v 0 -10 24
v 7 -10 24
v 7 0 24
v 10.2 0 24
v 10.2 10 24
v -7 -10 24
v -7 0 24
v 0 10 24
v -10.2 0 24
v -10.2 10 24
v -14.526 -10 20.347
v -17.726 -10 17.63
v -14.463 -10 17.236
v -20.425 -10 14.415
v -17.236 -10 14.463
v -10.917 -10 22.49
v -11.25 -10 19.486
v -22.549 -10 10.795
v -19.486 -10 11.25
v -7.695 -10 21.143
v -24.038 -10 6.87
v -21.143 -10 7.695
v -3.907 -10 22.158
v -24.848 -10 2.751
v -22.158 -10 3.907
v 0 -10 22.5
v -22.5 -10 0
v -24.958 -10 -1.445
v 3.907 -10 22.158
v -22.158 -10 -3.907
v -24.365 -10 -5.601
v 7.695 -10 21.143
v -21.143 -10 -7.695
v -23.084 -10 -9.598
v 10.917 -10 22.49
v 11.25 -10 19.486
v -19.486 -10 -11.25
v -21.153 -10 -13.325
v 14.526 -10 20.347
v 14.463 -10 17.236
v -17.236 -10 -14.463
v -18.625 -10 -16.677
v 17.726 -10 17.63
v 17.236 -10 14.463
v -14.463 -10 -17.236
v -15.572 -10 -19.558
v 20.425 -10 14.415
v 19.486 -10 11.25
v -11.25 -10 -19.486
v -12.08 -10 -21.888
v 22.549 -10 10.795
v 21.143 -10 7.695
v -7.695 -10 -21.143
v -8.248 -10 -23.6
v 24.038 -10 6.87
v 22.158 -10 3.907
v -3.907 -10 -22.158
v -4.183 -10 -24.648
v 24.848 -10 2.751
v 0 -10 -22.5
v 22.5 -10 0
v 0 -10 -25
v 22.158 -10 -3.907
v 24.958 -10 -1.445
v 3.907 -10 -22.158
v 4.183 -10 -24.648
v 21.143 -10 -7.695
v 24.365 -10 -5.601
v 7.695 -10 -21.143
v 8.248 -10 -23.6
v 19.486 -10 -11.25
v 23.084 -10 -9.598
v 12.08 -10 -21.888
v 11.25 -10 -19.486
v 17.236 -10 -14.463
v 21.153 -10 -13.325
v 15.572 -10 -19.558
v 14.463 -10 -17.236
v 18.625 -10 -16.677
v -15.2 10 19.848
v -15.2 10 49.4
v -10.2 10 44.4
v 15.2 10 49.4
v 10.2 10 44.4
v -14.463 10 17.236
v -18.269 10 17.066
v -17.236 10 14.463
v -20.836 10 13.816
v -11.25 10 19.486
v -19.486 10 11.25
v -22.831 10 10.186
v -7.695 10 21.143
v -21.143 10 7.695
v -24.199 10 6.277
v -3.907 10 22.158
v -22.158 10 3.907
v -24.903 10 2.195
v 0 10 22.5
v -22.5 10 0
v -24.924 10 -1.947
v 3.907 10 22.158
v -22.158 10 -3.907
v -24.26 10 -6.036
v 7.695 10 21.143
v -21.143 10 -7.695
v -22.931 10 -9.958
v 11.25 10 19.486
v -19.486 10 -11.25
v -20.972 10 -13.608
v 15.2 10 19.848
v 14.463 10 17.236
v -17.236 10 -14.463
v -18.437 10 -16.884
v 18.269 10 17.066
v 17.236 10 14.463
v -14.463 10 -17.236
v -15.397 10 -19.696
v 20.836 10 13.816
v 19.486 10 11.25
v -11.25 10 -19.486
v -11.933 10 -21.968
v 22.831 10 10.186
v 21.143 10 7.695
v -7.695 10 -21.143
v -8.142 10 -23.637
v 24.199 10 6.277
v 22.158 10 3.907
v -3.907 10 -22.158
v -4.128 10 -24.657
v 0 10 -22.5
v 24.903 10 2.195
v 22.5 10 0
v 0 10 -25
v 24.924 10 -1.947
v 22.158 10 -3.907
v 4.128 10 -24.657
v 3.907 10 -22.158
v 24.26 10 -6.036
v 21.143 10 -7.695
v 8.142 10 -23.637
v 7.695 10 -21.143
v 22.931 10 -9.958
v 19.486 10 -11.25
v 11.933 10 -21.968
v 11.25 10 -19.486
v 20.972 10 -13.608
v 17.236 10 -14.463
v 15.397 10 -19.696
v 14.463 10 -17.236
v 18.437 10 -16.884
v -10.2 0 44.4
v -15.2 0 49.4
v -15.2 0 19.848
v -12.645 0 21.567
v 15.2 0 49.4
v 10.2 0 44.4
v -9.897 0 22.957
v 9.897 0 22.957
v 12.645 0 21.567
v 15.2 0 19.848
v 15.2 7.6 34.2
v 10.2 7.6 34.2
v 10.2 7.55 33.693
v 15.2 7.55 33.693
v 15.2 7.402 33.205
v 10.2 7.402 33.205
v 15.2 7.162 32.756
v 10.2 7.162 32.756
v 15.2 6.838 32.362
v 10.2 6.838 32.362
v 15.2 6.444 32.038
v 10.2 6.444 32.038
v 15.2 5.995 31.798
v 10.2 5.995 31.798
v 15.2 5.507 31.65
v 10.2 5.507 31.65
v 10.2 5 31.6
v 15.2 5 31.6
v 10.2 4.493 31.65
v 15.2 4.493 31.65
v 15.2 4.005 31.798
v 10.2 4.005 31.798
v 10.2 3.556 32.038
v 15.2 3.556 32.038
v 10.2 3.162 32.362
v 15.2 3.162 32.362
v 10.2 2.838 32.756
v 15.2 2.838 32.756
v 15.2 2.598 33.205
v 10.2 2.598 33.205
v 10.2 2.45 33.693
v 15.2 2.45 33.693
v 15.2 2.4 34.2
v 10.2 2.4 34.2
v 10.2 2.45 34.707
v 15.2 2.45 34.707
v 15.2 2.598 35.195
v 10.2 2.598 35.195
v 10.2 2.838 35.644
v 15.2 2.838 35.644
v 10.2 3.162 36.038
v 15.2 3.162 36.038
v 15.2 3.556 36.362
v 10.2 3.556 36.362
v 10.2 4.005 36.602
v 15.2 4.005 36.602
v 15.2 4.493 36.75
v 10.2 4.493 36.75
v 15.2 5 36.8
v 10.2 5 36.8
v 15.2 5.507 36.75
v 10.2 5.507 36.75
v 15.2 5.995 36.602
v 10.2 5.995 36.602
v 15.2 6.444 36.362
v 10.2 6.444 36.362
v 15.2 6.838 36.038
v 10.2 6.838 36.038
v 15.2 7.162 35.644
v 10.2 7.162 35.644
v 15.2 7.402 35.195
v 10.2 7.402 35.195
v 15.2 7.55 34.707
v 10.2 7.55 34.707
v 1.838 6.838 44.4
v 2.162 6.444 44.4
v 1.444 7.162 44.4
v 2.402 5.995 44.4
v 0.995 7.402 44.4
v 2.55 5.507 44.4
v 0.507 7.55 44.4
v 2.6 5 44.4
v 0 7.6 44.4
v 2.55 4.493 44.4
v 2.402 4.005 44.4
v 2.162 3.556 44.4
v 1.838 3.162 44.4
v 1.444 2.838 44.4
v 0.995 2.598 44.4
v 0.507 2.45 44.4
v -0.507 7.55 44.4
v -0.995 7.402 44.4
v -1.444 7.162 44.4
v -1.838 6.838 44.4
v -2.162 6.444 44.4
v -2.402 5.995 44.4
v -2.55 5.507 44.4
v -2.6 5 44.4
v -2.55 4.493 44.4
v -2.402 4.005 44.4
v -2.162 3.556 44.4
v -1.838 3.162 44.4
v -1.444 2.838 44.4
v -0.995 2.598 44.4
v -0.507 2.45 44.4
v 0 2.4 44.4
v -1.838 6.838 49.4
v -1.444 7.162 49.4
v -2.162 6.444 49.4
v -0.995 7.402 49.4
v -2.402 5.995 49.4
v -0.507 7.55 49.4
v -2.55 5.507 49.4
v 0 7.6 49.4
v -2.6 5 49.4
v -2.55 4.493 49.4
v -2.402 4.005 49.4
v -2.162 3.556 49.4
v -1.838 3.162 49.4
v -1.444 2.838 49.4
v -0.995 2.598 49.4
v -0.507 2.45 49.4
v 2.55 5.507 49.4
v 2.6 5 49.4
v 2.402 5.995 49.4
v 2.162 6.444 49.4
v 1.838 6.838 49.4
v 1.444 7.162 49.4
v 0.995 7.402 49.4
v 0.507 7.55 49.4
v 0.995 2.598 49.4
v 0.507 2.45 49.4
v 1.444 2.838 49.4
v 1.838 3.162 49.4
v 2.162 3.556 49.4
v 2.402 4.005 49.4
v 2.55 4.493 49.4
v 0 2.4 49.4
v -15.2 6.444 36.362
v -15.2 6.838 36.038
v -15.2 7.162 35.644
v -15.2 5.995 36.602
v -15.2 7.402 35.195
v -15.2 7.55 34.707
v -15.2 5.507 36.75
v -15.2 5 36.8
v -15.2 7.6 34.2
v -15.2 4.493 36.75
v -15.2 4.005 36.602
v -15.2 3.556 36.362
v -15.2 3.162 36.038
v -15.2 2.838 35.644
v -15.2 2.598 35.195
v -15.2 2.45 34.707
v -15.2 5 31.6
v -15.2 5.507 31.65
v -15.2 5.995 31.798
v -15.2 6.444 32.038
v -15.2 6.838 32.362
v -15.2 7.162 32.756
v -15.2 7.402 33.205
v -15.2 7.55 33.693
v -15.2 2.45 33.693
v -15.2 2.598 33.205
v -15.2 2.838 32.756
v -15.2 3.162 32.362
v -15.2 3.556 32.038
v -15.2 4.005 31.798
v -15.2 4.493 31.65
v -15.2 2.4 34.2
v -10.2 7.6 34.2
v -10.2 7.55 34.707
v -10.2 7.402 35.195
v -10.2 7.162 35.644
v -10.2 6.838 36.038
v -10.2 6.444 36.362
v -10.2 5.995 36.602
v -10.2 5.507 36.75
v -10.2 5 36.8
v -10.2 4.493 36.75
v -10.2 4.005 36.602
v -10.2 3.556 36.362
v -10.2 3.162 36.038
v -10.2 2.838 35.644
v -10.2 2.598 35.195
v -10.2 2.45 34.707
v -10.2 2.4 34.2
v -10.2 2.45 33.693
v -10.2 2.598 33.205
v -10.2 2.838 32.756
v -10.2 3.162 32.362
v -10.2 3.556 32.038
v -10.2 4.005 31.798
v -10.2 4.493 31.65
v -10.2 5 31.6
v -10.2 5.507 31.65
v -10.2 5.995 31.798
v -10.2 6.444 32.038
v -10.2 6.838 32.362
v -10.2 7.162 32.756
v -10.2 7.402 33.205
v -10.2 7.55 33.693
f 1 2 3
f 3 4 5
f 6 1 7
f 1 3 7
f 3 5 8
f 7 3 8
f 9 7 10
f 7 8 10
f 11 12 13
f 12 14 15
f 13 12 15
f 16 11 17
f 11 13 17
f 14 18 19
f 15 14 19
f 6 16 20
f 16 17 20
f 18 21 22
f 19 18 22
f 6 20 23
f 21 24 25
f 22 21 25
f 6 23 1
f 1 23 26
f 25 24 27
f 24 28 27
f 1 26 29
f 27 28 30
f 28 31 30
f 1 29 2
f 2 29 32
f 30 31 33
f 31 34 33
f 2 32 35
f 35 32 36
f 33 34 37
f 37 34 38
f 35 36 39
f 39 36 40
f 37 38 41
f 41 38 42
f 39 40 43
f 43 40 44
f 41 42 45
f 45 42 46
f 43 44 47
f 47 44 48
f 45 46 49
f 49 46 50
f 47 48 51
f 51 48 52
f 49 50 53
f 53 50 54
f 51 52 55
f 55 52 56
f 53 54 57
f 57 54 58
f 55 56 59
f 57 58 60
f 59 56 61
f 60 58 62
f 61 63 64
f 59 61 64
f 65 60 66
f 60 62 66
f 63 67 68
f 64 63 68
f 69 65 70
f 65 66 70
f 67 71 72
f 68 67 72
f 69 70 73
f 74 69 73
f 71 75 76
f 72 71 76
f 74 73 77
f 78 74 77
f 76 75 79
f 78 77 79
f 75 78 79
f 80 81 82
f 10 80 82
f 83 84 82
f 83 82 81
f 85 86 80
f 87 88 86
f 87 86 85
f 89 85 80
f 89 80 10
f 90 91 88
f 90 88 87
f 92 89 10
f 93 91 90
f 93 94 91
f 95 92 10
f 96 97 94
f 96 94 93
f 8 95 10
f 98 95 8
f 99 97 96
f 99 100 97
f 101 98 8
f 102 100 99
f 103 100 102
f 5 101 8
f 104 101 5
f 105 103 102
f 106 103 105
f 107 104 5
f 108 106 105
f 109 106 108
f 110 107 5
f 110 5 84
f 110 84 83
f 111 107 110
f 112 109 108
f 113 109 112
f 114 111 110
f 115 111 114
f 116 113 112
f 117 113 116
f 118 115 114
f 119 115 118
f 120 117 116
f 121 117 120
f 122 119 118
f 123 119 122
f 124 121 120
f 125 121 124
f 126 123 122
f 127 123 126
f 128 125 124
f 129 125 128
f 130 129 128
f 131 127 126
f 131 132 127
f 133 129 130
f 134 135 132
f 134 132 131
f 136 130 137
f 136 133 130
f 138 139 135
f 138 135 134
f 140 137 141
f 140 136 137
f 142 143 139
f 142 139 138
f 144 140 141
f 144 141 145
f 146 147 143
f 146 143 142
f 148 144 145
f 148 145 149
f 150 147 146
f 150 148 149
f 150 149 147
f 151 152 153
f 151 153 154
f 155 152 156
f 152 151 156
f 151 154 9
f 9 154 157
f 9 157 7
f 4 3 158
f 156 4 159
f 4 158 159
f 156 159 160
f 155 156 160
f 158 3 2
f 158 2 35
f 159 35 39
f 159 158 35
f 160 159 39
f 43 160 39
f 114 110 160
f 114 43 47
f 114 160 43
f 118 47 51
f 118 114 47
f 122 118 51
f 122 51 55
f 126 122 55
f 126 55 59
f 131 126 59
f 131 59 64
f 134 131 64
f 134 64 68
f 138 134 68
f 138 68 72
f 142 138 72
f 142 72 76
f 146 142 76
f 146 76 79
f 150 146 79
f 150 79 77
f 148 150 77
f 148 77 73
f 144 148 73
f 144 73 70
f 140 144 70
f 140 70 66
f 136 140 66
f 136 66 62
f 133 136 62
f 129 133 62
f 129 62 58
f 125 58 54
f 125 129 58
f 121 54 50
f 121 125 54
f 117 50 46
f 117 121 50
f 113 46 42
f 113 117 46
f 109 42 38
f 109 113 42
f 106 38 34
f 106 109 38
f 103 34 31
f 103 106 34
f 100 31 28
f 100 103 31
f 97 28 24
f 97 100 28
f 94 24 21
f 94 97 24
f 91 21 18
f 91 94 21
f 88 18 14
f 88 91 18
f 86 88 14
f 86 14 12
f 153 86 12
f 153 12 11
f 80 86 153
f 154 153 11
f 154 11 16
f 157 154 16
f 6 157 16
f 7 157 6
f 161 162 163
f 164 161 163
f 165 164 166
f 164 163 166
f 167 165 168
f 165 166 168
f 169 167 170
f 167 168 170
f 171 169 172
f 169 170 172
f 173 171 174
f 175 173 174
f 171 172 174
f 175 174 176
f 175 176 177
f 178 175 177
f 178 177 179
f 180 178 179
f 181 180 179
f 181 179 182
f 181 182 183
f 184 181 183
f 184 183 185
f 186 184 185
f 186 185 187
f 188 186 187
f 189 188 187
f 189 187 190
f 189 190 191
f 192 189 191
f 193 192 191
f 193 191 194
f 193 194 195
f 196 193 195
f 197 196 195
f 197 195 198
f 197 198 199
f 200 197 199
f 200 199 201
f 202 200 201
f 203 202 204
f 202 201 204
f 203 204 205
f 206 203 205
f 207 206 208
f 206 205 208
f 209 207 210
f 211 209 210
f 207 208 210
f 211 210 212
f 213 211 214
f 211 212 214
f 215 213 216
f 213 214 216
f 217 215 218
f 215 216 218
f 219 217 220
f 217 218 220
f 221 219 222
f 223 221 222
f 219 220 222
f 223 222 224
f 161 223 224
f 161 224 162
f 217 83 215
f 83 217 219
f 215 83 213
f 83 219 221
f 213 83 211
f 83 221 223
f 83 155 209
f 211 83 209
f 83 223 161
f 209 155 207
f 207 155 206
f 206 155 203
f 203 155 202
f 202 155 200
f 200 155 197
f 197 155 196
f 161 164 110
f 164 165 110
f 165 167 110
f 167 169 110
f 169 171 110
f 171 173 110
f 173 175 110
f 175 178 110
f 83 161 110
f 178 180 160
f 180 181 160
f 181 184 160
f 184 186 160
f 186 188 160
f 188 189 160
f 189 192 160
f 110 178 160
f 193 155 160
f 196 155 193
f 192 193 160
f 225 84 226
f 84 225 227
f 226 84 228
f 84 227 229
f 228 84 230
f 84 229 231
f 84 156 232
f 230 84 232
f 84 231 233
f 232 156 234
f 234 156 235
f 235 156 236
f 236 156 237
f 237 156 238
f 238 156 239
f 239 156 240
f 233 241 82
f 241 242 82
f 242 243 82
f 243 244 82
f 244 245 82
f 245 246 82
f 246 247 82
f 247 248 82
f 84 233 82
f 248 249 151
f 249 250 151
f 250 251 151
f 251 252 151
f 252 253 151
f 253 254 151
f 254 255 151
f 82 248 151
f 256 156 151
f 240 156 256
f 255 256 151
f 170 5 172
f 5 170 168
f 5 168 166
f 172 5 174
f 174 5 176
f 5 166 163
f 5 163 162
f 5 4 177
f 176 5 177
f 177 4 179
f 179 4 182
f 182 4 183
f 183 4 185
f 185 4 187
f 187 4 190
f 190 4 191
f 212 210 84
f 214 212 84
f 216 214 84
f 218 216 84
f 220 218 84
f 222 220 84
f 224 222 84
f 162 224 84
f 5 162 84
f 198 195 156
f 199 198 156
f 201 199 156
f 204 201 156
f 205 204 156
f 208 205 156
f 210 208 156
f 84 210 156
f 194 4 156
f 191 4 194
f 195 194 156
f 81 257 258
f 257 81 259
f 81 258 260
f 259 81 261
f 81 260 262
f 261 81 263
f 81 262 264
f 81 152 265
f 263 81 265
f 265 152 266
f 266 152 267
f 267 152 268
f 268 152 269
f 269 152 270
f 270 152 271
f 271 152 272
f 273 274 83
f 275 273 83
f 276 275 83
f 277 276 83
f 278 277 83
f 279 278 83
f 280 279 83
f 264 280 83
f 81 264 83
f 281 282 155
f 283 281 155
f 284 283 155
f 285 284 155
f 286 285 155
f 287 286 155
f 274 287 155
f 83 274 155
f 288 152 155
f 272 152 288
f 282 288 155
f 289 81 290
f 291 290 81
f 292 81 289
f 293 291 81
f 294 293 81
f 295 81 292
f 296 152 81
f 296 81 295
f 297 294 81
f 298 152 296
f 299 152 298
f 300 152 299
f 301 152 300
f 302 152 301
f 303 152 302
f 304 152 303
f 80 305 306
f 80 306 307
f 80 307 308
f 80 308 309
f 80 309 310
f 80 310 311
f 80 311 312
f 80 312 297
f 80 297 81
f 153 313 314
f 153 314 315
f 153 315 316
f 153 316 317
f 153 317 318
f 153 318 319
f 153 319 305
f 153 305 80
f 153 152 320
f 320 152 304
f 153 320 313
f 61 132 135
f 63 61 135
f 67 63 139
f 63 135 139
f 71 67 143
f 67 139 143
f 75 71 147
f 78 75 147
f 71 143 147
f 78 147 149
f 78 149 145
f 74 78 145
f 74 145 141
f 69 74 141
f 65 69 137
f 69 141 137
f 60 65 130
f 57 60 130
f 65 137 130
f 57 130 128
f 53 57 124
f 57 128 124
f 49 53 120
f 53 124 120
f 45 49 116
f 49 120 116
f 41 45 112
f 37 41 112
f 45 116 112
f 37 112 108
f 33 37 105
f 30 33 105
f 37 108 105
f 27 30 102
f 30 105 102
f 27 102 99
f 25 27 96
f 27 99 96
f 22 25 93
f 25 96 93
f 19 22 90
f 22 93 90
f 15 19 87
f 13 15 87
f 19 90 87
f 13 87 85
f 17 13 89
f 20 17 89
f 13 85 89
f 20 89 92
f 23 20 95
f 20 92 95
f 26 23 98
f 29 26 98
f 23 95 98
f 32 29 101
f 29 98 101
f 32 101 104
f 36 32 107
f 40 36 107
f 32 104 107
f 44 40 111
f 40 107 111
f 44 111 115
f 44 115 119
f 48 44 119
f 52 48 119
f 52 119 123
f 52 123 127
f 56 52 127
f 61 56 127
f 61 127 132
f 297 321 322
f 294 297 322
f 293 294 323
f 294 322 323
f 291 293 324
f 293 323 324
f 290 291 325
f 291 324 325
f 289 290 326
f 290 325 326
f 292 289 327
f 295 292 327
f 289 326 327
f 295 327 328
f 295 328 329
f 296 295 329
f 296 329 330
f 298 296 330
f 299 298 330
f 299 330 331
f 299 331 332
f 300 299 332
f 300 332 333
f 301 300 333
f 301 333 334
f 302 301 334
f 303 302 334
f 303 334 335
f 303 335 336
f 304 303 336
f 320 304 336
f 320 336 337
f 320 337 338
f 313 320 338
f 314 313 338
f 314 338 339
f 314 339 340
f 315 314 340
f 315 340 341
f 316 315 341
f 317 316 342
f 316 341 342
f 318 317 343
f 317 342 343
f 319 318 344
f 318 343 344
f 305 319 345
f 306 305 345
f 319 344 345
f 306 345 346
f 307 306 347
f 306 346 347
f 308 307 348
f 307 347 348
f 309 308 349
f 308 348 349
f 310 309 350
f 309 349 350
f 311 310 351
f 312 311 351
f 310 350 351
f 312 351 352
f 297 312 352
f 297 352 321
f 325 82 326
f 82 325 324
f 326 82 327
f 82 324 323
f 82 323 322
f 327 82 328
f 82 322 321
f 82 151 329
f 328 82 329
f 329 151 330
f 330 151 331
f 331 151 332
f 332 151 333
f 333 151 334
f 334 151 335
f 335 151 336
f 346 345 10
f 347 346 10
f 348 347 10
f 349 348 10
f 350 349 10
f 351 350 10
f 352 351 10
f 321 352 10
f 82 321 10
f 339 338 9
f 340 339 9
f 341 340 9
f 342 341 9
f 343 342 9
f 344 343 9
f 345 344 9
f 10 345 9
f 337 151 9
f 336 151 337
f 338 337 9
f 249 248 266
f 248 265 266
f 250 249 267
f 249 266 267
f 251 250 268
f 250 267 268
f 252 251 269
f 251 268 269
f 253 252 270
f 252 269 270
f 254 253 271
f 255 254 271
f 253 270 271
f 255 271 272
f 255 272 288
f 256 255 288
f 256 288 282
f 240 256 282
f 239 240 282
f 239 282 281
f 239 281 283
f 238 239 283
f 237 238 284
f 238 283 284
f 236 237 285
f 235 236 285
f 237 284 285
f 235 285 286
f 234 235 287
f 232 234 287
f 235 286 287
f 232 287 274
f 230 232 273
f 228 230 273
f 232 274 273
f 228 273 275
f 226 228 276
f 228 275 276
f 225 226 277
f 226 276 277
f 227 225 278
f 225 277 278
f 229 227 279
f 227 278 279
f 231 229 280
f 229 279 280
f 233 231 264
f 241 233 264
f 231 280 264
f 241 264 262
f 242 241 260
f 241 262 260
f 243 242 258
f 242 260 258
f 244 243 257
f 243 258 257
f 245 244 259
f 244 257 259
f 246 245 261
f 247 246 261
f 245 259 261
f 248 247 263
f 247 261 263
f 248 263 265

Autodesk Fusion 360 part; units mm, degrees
sketch "스케치1" plane through (0, 0, 0) normal (0, 1, 0) x (1, 0, 0)
  circle A0 centre (0, 0) radius 22.5
  line L0 (0, 0) -> (0, -24)
  line L1 (0, -24) -> (15.2, -24)
  line L2 (15.2, -24) -> (-15.2, -24)
  line L3 (-15.2, -24) -> (-15.2, -49.4)
  line L4 (-15.2, -49.4) -> (15.2, -49.4)
  line L5 (15.2, -49.4) -> (15.2, -24)
  circle A1 centre (0, 0) radius 25
  line L6 (-15.2, -24) -> (-15.2, -18.5)
  line L7 (15.2, -24) -> (15.2, -18.5685)
  line L8 (0, -36.7) -> (0, -34.2)
  line L9 (10.2, -44.4) -> (-10.2, -44.4)
  line L10 (-10.2, -44.4) -> (-10.2, -24)
  line L11 (-10.2, -24) -> (10.2, -24)
  line L12 (10.2, -24) -> (10.2, -44.4)
  line L13 (10.2, -44.4) -> (-10.2, -24) construction
  line L14 (-10.2, -44.4) -> (10.2, -24) construction
  point P0 (0, -36.7)
  point P1 (0, -34.2)
  dimension "d1" = 45
  dimension "d2" = 24
  dimension "d3" = 15.2
  dimension "d4" = 30.4
  dimension "d5" = 25.4
  dimension "d8" = 50
  dimension "d13" = 2.5
  dimension "d14" = 20.4
  dimension "d15" = 20.4
extrude "돌출1" add sketch "스케치1" along normal blind 10 contours L1 L2 A1 L7 L11 | L1 L2 L3 L4 L5 L9 L10 L12 | L1 L2 A1 L11 | L2 A1 L6 L11 picked at (-16.0726, -17.9881)
extrude "돌출2" add sketch "스케치1" against normal blind 10 contours L1 L2 A1 L11 picked at (-16.0726, -17.9881)
sketch "스케치2" plane through (0, 0, 49.4) normal (0, 0, 1) x (-1, 0, 0)
  line L0 (15.2, 0) -> (-15.2, 0)
  line L1 (-15.2, 0) -> (-15.2, -10)
  line L2 (-15.2, -10) -> (15.2, -10)
  line L3 (15.2, -10) -> (15.2, 0)
  circle A0 centre (0, -5) radius 2.6
  dimension "d18" = 5.2
extrude "돌출3" cut sketch "스케치2" against normal blind 11 contours A0
sketch "스케치3" plane through (-10.2, 0, 0) normal (1, 0, 0) x (0, 1, 0)
  line L0 (0, 44.4) -> (0, 24)
  line L1 (0, 24) -> (10, 24)
  line L2 (10, 24) -> (10, 44.4)
  line L3 (10, 44.4) -> (0, 44.4)
  circle A0 centre (5, 34.2) radius 2.6
  dimension "d21" = 5.2
extrude "돌출4" cut sketch "스케치3" along normal blind 33 contours A0
extrude "돌출5" cut sketch "스케치3" against normal blind 17 contours A0
